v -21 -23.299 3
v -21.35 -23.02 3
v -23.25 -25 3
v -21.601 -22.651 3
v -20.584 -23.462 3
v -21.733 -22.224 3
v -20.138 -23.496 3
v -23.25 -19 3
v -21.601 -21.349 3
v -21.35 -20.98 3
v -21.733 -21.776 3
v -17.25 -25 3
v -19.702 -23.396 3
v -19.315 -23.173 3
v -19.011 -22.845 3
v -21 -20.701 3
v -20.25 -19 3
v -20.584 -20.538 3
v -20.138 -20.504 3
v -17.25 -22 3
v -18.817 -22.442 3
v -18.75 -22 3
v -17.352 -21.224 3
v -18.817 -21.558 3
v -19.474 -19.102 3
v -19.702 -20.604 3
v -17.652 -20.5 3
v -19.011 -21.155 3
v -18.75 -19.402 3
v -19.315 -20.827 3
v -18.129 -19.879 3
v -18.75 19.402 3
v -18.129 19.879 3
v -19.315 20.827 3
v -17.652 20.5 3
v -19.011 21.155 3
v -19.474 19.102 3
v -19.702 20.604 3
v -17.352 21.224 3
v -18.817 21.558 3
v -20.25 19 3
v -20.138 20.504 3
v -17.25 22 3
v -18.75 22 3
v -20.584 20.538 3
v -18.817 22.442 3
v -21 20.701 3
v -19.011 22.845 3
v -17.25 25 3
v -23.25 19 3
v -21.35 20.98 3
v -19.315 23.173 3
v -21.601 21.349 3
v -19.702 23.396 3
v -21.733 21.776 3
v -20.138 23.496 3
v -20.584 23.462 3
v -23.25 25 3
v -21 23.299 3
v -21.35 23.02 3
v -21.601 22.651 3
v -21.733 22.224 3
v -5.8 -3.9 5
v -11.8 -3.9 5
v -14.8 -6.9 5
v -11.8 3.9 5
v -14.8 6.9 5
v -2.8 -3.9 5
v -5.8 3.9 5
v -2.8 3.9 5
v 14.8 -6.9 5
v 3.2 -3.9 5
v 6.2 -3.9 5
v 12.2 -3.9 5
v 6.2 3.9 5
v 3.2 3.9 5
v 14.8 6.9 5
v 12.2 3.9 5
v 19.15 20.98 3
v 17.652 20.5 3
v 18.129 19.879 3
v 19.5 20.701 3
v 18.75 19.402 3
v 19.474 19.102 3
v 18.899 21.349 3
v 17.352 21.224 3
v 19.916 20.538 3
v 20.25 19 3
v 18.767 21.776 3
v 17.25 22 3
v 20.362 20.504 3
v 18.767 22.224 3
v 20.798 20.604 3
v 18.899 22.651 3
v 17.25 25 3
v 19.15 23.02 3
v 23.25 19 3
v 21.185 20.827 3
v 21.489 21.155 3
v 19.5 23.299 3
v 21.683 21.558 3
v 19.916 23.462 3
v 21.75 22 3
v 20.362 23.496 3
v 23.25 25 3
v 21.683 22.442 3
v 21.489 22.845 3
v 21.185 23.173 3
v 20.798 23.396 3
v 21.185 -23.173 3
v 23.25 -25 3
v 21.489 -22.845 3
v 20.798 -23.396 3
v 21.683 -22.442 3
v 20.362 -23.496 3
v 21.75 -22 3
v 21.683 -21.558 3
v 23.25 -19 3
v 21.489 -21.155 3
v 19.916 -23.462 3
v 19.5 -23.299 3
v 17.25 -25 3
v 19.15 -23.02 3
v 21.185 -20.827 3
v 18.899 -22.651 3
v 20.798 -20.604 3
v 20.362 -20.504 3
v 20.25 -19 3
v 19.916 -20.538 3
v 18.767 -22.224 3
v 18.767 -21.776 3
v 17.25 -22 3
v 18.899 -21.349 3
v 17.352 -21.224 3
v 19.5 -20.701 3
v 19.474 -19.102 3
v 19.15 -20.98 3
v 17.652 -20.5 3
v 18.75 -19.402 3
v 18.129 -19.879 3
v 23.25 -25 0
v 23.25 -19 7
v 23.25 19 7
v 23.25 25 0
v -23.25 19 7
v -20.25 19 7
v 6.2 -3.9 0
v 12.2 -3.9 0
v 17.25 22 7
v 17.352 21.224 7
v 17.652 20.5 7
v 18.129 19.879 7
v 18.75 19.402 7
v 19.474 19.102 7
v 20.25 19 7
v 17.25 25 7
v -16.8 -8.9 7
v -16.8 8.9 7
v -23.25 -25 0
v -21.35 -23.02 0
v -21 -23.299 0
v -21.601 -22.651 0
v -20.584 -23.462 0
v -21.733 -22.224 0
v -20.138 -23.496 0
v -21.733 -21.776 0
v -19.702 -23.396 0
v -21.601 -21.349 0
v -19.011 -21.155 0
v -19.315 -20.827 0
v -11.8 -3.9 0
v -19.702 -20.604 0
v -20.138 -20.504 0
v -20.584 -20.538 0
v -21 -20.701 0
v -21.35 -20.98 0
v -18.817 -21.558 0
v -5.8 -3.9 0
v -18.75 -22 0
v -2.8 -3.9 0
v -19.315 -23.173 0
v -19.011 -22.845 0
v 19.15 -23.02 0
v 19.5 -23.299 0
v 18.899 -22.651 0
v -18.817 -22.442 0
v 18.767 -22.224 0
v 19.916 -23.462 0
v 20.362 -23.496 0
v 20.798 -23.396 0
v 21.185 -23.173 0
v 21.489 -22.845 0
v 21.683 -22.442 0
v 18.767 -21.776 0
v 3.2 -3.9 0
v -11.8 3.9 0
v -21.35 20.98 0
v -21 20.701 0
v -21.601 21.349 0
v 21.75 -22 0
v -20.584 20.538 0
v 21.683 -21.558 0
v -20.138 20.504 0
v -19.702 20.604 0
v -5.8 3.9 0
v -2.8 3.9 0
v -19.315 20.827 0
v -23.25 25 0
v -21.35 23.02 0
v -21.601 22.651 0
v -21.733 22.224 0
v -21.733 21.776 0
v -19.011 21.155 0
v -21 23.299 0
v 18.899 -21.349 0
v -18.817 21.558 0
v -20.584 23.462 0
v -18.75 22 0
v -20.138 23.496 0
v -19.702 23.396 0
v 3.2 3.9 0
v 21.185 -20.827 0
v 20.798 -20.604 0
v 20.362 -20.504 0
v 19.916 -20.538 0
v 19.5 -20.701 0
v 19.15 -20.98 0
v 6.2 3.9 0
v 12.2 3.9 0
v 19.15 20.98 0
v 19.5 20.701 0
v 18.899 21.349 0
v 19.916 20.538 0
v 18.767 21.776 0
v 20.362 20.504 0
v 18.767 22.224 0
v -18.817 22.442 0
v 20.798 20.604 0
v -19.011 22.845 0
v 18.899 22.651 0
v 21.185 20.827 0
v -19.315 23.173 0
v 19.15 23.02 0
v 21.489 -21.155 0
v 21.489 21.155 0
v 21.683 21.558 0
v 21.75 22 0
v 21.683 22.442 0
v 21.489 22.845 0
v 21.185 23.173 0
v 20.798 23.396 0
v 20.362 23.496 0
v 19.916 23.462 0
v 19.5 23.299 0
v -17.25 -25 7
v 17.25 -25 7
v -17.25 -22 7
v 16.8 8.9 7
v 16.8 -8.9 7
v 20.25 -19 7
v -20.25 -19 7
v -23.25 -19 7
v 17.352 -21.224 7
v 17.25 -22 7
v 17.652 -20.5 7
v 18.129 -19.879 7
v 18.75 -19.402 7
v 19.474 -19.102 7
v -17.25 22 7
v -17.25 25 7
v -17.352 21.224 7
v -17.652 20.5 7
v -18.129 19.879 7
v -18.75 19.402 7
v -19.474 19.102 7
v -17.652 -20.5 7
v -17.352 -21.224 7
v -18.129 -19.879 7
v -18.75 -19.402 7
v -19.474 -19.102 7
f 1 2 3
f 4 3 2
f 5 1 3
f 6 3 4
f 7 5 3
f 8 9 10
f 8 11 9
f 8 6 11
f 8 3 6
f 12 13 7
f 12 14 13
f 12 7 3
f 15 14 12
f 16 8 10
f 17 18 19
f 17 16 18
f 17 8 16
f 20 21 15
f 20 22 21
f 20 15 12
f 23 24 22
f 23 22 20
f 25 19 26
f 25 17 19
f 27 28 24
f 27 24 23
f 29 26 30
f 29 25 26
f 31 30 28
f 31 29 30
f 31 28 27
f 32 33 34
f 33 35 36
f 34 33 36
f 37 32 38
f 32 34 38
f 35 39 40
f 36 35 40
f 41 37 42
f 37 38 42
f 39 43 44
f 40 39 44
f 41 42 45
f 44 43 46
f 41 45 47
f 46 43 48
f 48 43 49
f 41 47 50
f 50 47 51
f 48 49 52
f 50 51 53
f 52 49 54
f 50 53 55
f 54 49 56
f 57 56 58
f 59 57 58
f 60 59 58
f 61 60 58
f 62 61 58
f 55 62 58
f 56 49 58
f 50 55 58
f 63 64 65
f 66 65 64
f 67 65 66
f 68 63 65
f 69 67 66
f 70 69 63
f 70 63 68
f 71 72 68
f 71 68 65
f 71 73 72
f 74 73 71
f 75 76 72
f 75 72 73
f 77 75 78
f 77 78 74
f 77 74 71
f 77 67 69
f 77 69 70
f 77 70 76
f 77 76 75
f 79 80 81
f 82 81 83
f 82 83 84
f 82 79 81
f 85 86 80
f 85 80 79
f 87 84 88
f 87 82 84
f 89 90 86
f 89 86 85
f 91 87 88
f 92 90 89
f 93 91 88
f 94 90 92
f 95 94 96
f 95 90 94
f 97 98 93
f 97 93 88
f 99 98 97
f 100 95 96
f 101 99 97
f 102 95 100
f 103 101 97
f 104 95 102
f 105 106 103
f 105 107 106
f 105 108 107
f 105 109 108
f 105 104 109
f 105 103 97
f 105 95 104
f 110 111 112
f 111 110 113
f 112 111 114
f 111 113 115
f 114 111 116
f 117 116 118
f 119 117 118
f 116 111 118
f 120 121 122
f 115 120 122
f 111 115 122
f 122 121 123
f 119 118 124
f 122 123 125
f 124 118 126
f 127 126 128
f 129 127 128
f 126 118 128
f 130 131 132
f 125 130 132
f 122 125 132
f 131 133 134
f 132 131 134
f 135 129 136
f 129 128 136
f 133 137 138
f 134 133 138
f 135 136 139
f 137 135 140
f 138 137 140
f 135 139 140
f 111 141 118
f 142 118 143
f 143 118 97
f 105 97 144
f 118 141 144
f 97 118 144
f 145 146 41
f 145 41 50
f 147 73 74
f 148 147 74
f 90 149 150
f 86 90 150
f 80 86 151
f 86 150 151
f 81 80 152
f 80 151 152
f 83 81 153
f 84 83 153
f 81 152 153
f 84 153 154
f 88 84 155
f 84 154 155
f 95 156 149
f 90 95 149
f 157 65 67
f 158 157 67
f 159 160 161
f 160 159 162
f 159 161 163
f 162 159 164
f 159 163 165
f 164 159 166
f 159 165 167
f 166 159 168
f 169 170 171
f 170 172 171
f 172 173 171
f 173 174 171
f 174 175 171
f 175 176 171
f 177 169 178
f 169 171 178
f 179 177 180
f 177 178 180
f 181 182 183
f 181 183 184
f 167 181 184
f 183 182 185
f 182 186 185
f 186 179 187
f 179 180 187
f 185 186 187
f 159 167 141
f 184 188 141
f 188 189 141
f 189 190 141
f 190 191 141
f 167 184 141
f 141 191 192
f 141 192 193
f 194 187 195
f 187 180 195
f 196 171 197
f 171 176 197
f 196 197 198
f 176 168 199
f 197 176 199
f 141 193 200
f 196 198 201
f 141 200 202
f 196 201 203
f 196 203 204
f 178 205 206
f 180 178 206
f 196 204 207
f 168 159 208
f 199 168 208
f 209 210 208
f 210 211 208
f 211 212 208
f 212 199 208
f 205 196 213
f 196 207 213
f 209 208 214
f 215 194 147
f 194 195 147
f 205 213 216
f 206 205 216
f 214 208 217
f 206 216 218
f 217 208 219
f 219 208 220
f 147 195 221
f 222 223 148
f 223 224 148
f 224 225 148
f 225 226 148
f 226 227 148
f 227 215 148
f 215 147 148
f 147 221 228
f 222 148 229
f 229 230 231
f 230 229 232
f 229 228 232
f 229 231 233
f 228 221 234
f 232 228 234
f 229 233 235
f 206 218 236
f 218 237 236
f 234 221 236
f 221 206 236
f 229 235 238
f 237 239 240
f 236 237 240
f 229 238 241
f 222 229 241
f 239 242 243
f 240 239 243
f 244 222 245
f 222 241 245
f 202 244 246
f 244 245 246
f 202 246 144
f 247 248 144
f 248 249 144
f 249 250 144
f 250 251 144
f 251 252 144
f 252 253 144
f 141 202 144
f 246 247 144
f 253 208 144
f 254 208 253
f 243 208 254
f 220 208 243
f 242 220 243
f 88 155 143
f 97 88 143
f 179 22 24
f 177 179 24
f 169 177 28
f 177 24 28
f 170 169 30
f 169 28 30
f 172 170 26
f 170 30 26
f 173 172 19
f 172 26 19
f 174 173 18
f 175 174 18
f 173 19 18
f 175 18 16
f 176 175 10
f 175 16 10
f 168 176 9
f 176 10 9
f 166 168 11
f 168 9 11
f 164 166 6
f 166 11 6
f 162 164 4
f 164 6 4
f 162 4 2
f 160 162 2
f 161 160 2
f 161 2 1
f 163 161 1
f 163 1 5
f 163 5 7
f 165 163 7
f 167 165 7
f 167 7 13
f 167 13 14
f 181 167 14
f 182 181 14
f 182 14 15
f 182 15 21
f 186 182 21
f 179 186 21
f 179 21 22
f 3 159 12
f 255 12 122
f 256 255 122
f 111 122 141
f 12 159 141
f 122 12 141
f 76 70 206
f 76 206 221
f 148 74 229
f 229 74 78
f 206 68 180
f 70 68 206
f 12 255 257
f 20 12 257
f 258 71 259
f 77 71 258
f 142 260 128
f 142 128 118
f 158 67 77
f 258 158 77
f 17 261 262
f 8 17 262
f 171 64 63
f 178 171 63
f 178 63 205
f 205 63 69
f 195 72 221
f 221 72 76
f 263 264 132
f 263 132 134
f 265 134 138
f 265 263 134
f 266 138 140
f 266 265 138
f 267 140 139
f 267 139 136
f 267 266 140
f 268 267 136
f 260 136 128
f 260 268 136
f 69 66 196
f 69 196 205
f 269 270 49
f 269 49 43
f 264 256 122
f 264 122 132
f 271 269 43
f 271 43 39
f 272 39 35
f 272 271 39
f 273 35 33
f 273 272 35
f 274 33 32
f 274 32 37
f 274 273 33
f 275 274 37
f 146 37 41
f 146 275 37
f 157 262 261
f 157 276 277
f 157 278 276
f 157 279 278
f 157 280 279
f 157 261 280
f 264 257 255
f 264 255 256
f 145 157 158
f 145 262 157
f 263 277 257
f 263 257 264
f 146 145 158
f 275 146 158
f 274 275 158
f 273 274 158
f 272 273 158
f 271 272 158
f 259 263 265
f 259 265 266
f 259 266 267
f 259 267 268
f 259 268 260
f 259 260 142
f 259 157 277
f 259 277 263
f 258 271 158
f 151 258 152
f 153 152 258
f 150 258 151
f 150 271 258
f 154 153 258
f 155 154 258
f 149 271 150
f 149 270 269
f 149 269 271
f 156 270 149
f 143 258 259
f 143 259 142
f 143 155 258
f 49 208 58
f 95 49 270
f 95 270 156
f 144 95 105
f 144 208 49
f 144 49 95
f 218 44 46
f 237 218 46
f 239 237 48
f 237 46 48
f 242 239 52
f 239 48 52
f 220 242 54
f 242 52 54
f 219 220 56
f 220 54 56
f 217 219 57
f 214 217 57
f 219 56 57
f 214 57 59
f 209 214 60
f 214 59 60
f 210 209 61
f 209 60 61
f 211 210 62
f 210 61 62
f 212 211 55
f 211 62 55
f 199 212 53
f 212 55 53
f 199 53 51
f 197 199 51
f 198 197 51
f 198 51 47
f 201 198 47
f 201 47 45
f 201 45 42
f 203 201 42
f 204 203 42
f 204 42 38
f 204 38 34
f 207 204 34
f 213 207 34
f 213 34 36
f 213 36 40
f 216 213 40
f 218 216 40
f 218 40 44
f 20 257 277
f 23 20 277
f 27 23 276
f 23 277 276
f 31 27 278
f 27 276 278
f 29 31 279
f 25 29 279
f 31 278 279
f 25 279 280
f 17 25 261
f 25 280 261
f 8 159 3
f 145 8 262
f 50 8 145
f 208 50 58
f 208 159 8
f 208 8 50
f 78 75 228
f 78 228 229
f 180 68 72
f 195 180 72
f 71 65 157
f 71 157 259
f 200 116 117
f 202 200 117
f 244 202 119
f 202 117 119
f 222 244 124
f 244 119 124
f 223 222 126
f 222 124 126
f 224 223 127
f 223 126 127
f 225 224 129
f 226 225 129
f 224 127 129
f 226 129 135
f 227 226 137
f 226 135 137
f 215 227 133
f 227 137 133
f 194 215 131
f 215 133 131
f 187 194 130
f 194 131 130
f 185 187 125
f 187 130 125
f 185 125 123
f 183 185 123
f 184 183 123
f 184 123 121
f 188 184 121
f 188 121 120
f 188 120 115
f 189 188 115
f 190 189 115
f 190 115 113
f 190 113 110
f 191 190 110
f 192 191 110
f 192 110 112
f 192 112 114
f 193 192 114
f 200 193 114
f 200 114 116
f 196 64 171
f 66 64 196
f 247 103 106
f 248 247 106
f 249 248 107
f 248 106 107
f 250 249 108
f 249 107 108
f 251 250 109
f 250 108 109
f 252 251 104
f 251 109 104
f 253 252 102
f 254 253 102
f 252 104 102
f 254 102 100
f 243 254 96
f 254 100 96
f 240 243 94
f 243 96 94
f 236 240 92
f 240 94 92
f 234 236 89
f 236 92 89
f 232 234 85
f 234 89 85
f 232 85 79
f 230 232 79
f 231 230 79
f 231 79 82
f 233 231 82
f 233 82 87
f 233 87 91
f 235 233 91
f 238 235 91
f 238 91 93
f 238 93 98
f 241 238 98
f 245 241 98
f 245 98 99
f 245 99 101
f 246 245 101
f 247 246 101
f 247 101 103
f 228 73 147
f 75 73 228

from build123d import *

# Parameters (mm, degrees)
SKETCH1_W           = 46.5
SKETCH1_H           = 50
BOSS_EXTRUDE1_DEPTH = 7
SKETCH2_W           = 33.6
SKETCH2_H           = 17.8
CUT_EXTRUDE1_DEPTH  = 2
CHAMFER1_SIZE       = 2
CUT_EXTRUDE2_DEPTH  = 4
SKETCH4_R           = 1.5
CUT_EXTRUDE3_DEPTH  = 10
SKETCH5_W           = 6
SKETCH5_H           = 7.8
CUT_EXTRUDE4_DEPTH  = 10


with BuildPart() as part:
    # Sketch1 → Boss-Extrude1 (new body)
    with BuildSketch(Plane.XY):
        Rectangle(SKETCH1_W, SKETCH1_H)
    extrude(amount=BOSS_EXTRUDE1_DEPTH)

    # Sketch2 → Cut-Extrude1 (cut)
    with BuildSketch(Plane.XY.offset(7)):
        Rectangle(SKETCH2_W, SKETCH2_H)
    extrude(amount=-CUT_EXTRUDE1_DEPTH, mode=Mode.SUBTRACT)

    # Chamfer1
    chamfer1_edges = [part.edges().sort_by_distance(p)[0] for p in [
        (0, -8.9, 5),
        (16.8, 0, 5),
        (0, 8.9, 5),
        (-16.8, 0, 5),
    ]]
    chamfer(chamfer1_edges, length=CHAMFER1_SIZE - 0.0001)  # a hair under: the kernel refuses the full size

    # Sketch3 → Cut-Extrude2 (cut)
    with BuildSketch(Plane.XY.offset(7)):
        with BuildLine():
            Line((23.25, -25), (17.25, -25))
            Line((17.25, -25), (17.25, -22))
            ThreePointArc((17.25, -22), (18.128679656, -19.878679656), (20.25, -19))
            Line((20.25, -19), (23.25, -19))
            Line((23.25, -19), (23.25, -25))
        make_face()
        with BuildLine():
            Line((-23.25, -25), (-17.25, -25))
            Line((-17.25, -25), (-17.25, -22))
            ThreePointArc((-17.25, -22), (-18.128679656, -19.878679656), (-20.25, -19))
            Line((-20.25, -19), (-23.25, -19))
            Line((-23.25, -19), (-23.25, -25))
        make_face()
        with BuildLine():
            Line((-17.25, 25), (-17.25, 22))
            ThreePointArc((-17.25, 22), (-18.128679656, 19.878679656), (-20.25, 19))
            Line((-20.25, 19), (-23.25, 19))
            Line((-23.25, 19), (-23.25, 25))
            Line((-23.25, 25), (-17.25, 25))
        make_face()
        with BuildLine():
            Line((17.25, 25), (17.25, 22))
            ThreePointArc((17.25, 22), (18.128679656, 19.878679656), (20.25, 19))
            Line((20.25, 19), (23.25, 19))
            Line((23.25, 19), (23.25, 25))
            Line((23.25, 25), (17.25, 25))
        make_face()
    extrude(amount=-CUT_EXTRUDE2_DEPTH, mode=Mode.SUBTRACT)

    # Sketch4 → Cut-Extrude3 (cut)
    with BuildSketch(Plane.XY.offset(7)):
        with Locations((-20.25, 22)):
            Circle(SKETCH4_R)
        with Locations((20.25, 22)):
            Circle(SKETCH4_R)
        with Locations((20.25, -22)):
            Circle(SKETCH4_R)
        with Locations((-20.25, -22)):
            Circle(SKETCH4_R)
    extrude(amount=-CUT_EXTRUDE3_DEPTH, mode=Mode.SUBTRACT)

    # Sketch5 → Cut-Extrude4 (cut)
    with BuildSketch(Plane.XY.offset(5)):
        with Locations((-8.8, 0)):
            Rectangle(SKETCH5_W, SKETCH5_H)
        with Locations((0.2, 0)):
            Rectangle(SKETCH5_W, SKETCH5_H)
        with Locations((9.2, 0)):
            Rectangle(SKETCH5_W, SKETCH5_H)
    extrude(amount=-CUT_EXTRUDE4_DEPTH, mode=Mode.SUBTRACT)


solid = part.part
